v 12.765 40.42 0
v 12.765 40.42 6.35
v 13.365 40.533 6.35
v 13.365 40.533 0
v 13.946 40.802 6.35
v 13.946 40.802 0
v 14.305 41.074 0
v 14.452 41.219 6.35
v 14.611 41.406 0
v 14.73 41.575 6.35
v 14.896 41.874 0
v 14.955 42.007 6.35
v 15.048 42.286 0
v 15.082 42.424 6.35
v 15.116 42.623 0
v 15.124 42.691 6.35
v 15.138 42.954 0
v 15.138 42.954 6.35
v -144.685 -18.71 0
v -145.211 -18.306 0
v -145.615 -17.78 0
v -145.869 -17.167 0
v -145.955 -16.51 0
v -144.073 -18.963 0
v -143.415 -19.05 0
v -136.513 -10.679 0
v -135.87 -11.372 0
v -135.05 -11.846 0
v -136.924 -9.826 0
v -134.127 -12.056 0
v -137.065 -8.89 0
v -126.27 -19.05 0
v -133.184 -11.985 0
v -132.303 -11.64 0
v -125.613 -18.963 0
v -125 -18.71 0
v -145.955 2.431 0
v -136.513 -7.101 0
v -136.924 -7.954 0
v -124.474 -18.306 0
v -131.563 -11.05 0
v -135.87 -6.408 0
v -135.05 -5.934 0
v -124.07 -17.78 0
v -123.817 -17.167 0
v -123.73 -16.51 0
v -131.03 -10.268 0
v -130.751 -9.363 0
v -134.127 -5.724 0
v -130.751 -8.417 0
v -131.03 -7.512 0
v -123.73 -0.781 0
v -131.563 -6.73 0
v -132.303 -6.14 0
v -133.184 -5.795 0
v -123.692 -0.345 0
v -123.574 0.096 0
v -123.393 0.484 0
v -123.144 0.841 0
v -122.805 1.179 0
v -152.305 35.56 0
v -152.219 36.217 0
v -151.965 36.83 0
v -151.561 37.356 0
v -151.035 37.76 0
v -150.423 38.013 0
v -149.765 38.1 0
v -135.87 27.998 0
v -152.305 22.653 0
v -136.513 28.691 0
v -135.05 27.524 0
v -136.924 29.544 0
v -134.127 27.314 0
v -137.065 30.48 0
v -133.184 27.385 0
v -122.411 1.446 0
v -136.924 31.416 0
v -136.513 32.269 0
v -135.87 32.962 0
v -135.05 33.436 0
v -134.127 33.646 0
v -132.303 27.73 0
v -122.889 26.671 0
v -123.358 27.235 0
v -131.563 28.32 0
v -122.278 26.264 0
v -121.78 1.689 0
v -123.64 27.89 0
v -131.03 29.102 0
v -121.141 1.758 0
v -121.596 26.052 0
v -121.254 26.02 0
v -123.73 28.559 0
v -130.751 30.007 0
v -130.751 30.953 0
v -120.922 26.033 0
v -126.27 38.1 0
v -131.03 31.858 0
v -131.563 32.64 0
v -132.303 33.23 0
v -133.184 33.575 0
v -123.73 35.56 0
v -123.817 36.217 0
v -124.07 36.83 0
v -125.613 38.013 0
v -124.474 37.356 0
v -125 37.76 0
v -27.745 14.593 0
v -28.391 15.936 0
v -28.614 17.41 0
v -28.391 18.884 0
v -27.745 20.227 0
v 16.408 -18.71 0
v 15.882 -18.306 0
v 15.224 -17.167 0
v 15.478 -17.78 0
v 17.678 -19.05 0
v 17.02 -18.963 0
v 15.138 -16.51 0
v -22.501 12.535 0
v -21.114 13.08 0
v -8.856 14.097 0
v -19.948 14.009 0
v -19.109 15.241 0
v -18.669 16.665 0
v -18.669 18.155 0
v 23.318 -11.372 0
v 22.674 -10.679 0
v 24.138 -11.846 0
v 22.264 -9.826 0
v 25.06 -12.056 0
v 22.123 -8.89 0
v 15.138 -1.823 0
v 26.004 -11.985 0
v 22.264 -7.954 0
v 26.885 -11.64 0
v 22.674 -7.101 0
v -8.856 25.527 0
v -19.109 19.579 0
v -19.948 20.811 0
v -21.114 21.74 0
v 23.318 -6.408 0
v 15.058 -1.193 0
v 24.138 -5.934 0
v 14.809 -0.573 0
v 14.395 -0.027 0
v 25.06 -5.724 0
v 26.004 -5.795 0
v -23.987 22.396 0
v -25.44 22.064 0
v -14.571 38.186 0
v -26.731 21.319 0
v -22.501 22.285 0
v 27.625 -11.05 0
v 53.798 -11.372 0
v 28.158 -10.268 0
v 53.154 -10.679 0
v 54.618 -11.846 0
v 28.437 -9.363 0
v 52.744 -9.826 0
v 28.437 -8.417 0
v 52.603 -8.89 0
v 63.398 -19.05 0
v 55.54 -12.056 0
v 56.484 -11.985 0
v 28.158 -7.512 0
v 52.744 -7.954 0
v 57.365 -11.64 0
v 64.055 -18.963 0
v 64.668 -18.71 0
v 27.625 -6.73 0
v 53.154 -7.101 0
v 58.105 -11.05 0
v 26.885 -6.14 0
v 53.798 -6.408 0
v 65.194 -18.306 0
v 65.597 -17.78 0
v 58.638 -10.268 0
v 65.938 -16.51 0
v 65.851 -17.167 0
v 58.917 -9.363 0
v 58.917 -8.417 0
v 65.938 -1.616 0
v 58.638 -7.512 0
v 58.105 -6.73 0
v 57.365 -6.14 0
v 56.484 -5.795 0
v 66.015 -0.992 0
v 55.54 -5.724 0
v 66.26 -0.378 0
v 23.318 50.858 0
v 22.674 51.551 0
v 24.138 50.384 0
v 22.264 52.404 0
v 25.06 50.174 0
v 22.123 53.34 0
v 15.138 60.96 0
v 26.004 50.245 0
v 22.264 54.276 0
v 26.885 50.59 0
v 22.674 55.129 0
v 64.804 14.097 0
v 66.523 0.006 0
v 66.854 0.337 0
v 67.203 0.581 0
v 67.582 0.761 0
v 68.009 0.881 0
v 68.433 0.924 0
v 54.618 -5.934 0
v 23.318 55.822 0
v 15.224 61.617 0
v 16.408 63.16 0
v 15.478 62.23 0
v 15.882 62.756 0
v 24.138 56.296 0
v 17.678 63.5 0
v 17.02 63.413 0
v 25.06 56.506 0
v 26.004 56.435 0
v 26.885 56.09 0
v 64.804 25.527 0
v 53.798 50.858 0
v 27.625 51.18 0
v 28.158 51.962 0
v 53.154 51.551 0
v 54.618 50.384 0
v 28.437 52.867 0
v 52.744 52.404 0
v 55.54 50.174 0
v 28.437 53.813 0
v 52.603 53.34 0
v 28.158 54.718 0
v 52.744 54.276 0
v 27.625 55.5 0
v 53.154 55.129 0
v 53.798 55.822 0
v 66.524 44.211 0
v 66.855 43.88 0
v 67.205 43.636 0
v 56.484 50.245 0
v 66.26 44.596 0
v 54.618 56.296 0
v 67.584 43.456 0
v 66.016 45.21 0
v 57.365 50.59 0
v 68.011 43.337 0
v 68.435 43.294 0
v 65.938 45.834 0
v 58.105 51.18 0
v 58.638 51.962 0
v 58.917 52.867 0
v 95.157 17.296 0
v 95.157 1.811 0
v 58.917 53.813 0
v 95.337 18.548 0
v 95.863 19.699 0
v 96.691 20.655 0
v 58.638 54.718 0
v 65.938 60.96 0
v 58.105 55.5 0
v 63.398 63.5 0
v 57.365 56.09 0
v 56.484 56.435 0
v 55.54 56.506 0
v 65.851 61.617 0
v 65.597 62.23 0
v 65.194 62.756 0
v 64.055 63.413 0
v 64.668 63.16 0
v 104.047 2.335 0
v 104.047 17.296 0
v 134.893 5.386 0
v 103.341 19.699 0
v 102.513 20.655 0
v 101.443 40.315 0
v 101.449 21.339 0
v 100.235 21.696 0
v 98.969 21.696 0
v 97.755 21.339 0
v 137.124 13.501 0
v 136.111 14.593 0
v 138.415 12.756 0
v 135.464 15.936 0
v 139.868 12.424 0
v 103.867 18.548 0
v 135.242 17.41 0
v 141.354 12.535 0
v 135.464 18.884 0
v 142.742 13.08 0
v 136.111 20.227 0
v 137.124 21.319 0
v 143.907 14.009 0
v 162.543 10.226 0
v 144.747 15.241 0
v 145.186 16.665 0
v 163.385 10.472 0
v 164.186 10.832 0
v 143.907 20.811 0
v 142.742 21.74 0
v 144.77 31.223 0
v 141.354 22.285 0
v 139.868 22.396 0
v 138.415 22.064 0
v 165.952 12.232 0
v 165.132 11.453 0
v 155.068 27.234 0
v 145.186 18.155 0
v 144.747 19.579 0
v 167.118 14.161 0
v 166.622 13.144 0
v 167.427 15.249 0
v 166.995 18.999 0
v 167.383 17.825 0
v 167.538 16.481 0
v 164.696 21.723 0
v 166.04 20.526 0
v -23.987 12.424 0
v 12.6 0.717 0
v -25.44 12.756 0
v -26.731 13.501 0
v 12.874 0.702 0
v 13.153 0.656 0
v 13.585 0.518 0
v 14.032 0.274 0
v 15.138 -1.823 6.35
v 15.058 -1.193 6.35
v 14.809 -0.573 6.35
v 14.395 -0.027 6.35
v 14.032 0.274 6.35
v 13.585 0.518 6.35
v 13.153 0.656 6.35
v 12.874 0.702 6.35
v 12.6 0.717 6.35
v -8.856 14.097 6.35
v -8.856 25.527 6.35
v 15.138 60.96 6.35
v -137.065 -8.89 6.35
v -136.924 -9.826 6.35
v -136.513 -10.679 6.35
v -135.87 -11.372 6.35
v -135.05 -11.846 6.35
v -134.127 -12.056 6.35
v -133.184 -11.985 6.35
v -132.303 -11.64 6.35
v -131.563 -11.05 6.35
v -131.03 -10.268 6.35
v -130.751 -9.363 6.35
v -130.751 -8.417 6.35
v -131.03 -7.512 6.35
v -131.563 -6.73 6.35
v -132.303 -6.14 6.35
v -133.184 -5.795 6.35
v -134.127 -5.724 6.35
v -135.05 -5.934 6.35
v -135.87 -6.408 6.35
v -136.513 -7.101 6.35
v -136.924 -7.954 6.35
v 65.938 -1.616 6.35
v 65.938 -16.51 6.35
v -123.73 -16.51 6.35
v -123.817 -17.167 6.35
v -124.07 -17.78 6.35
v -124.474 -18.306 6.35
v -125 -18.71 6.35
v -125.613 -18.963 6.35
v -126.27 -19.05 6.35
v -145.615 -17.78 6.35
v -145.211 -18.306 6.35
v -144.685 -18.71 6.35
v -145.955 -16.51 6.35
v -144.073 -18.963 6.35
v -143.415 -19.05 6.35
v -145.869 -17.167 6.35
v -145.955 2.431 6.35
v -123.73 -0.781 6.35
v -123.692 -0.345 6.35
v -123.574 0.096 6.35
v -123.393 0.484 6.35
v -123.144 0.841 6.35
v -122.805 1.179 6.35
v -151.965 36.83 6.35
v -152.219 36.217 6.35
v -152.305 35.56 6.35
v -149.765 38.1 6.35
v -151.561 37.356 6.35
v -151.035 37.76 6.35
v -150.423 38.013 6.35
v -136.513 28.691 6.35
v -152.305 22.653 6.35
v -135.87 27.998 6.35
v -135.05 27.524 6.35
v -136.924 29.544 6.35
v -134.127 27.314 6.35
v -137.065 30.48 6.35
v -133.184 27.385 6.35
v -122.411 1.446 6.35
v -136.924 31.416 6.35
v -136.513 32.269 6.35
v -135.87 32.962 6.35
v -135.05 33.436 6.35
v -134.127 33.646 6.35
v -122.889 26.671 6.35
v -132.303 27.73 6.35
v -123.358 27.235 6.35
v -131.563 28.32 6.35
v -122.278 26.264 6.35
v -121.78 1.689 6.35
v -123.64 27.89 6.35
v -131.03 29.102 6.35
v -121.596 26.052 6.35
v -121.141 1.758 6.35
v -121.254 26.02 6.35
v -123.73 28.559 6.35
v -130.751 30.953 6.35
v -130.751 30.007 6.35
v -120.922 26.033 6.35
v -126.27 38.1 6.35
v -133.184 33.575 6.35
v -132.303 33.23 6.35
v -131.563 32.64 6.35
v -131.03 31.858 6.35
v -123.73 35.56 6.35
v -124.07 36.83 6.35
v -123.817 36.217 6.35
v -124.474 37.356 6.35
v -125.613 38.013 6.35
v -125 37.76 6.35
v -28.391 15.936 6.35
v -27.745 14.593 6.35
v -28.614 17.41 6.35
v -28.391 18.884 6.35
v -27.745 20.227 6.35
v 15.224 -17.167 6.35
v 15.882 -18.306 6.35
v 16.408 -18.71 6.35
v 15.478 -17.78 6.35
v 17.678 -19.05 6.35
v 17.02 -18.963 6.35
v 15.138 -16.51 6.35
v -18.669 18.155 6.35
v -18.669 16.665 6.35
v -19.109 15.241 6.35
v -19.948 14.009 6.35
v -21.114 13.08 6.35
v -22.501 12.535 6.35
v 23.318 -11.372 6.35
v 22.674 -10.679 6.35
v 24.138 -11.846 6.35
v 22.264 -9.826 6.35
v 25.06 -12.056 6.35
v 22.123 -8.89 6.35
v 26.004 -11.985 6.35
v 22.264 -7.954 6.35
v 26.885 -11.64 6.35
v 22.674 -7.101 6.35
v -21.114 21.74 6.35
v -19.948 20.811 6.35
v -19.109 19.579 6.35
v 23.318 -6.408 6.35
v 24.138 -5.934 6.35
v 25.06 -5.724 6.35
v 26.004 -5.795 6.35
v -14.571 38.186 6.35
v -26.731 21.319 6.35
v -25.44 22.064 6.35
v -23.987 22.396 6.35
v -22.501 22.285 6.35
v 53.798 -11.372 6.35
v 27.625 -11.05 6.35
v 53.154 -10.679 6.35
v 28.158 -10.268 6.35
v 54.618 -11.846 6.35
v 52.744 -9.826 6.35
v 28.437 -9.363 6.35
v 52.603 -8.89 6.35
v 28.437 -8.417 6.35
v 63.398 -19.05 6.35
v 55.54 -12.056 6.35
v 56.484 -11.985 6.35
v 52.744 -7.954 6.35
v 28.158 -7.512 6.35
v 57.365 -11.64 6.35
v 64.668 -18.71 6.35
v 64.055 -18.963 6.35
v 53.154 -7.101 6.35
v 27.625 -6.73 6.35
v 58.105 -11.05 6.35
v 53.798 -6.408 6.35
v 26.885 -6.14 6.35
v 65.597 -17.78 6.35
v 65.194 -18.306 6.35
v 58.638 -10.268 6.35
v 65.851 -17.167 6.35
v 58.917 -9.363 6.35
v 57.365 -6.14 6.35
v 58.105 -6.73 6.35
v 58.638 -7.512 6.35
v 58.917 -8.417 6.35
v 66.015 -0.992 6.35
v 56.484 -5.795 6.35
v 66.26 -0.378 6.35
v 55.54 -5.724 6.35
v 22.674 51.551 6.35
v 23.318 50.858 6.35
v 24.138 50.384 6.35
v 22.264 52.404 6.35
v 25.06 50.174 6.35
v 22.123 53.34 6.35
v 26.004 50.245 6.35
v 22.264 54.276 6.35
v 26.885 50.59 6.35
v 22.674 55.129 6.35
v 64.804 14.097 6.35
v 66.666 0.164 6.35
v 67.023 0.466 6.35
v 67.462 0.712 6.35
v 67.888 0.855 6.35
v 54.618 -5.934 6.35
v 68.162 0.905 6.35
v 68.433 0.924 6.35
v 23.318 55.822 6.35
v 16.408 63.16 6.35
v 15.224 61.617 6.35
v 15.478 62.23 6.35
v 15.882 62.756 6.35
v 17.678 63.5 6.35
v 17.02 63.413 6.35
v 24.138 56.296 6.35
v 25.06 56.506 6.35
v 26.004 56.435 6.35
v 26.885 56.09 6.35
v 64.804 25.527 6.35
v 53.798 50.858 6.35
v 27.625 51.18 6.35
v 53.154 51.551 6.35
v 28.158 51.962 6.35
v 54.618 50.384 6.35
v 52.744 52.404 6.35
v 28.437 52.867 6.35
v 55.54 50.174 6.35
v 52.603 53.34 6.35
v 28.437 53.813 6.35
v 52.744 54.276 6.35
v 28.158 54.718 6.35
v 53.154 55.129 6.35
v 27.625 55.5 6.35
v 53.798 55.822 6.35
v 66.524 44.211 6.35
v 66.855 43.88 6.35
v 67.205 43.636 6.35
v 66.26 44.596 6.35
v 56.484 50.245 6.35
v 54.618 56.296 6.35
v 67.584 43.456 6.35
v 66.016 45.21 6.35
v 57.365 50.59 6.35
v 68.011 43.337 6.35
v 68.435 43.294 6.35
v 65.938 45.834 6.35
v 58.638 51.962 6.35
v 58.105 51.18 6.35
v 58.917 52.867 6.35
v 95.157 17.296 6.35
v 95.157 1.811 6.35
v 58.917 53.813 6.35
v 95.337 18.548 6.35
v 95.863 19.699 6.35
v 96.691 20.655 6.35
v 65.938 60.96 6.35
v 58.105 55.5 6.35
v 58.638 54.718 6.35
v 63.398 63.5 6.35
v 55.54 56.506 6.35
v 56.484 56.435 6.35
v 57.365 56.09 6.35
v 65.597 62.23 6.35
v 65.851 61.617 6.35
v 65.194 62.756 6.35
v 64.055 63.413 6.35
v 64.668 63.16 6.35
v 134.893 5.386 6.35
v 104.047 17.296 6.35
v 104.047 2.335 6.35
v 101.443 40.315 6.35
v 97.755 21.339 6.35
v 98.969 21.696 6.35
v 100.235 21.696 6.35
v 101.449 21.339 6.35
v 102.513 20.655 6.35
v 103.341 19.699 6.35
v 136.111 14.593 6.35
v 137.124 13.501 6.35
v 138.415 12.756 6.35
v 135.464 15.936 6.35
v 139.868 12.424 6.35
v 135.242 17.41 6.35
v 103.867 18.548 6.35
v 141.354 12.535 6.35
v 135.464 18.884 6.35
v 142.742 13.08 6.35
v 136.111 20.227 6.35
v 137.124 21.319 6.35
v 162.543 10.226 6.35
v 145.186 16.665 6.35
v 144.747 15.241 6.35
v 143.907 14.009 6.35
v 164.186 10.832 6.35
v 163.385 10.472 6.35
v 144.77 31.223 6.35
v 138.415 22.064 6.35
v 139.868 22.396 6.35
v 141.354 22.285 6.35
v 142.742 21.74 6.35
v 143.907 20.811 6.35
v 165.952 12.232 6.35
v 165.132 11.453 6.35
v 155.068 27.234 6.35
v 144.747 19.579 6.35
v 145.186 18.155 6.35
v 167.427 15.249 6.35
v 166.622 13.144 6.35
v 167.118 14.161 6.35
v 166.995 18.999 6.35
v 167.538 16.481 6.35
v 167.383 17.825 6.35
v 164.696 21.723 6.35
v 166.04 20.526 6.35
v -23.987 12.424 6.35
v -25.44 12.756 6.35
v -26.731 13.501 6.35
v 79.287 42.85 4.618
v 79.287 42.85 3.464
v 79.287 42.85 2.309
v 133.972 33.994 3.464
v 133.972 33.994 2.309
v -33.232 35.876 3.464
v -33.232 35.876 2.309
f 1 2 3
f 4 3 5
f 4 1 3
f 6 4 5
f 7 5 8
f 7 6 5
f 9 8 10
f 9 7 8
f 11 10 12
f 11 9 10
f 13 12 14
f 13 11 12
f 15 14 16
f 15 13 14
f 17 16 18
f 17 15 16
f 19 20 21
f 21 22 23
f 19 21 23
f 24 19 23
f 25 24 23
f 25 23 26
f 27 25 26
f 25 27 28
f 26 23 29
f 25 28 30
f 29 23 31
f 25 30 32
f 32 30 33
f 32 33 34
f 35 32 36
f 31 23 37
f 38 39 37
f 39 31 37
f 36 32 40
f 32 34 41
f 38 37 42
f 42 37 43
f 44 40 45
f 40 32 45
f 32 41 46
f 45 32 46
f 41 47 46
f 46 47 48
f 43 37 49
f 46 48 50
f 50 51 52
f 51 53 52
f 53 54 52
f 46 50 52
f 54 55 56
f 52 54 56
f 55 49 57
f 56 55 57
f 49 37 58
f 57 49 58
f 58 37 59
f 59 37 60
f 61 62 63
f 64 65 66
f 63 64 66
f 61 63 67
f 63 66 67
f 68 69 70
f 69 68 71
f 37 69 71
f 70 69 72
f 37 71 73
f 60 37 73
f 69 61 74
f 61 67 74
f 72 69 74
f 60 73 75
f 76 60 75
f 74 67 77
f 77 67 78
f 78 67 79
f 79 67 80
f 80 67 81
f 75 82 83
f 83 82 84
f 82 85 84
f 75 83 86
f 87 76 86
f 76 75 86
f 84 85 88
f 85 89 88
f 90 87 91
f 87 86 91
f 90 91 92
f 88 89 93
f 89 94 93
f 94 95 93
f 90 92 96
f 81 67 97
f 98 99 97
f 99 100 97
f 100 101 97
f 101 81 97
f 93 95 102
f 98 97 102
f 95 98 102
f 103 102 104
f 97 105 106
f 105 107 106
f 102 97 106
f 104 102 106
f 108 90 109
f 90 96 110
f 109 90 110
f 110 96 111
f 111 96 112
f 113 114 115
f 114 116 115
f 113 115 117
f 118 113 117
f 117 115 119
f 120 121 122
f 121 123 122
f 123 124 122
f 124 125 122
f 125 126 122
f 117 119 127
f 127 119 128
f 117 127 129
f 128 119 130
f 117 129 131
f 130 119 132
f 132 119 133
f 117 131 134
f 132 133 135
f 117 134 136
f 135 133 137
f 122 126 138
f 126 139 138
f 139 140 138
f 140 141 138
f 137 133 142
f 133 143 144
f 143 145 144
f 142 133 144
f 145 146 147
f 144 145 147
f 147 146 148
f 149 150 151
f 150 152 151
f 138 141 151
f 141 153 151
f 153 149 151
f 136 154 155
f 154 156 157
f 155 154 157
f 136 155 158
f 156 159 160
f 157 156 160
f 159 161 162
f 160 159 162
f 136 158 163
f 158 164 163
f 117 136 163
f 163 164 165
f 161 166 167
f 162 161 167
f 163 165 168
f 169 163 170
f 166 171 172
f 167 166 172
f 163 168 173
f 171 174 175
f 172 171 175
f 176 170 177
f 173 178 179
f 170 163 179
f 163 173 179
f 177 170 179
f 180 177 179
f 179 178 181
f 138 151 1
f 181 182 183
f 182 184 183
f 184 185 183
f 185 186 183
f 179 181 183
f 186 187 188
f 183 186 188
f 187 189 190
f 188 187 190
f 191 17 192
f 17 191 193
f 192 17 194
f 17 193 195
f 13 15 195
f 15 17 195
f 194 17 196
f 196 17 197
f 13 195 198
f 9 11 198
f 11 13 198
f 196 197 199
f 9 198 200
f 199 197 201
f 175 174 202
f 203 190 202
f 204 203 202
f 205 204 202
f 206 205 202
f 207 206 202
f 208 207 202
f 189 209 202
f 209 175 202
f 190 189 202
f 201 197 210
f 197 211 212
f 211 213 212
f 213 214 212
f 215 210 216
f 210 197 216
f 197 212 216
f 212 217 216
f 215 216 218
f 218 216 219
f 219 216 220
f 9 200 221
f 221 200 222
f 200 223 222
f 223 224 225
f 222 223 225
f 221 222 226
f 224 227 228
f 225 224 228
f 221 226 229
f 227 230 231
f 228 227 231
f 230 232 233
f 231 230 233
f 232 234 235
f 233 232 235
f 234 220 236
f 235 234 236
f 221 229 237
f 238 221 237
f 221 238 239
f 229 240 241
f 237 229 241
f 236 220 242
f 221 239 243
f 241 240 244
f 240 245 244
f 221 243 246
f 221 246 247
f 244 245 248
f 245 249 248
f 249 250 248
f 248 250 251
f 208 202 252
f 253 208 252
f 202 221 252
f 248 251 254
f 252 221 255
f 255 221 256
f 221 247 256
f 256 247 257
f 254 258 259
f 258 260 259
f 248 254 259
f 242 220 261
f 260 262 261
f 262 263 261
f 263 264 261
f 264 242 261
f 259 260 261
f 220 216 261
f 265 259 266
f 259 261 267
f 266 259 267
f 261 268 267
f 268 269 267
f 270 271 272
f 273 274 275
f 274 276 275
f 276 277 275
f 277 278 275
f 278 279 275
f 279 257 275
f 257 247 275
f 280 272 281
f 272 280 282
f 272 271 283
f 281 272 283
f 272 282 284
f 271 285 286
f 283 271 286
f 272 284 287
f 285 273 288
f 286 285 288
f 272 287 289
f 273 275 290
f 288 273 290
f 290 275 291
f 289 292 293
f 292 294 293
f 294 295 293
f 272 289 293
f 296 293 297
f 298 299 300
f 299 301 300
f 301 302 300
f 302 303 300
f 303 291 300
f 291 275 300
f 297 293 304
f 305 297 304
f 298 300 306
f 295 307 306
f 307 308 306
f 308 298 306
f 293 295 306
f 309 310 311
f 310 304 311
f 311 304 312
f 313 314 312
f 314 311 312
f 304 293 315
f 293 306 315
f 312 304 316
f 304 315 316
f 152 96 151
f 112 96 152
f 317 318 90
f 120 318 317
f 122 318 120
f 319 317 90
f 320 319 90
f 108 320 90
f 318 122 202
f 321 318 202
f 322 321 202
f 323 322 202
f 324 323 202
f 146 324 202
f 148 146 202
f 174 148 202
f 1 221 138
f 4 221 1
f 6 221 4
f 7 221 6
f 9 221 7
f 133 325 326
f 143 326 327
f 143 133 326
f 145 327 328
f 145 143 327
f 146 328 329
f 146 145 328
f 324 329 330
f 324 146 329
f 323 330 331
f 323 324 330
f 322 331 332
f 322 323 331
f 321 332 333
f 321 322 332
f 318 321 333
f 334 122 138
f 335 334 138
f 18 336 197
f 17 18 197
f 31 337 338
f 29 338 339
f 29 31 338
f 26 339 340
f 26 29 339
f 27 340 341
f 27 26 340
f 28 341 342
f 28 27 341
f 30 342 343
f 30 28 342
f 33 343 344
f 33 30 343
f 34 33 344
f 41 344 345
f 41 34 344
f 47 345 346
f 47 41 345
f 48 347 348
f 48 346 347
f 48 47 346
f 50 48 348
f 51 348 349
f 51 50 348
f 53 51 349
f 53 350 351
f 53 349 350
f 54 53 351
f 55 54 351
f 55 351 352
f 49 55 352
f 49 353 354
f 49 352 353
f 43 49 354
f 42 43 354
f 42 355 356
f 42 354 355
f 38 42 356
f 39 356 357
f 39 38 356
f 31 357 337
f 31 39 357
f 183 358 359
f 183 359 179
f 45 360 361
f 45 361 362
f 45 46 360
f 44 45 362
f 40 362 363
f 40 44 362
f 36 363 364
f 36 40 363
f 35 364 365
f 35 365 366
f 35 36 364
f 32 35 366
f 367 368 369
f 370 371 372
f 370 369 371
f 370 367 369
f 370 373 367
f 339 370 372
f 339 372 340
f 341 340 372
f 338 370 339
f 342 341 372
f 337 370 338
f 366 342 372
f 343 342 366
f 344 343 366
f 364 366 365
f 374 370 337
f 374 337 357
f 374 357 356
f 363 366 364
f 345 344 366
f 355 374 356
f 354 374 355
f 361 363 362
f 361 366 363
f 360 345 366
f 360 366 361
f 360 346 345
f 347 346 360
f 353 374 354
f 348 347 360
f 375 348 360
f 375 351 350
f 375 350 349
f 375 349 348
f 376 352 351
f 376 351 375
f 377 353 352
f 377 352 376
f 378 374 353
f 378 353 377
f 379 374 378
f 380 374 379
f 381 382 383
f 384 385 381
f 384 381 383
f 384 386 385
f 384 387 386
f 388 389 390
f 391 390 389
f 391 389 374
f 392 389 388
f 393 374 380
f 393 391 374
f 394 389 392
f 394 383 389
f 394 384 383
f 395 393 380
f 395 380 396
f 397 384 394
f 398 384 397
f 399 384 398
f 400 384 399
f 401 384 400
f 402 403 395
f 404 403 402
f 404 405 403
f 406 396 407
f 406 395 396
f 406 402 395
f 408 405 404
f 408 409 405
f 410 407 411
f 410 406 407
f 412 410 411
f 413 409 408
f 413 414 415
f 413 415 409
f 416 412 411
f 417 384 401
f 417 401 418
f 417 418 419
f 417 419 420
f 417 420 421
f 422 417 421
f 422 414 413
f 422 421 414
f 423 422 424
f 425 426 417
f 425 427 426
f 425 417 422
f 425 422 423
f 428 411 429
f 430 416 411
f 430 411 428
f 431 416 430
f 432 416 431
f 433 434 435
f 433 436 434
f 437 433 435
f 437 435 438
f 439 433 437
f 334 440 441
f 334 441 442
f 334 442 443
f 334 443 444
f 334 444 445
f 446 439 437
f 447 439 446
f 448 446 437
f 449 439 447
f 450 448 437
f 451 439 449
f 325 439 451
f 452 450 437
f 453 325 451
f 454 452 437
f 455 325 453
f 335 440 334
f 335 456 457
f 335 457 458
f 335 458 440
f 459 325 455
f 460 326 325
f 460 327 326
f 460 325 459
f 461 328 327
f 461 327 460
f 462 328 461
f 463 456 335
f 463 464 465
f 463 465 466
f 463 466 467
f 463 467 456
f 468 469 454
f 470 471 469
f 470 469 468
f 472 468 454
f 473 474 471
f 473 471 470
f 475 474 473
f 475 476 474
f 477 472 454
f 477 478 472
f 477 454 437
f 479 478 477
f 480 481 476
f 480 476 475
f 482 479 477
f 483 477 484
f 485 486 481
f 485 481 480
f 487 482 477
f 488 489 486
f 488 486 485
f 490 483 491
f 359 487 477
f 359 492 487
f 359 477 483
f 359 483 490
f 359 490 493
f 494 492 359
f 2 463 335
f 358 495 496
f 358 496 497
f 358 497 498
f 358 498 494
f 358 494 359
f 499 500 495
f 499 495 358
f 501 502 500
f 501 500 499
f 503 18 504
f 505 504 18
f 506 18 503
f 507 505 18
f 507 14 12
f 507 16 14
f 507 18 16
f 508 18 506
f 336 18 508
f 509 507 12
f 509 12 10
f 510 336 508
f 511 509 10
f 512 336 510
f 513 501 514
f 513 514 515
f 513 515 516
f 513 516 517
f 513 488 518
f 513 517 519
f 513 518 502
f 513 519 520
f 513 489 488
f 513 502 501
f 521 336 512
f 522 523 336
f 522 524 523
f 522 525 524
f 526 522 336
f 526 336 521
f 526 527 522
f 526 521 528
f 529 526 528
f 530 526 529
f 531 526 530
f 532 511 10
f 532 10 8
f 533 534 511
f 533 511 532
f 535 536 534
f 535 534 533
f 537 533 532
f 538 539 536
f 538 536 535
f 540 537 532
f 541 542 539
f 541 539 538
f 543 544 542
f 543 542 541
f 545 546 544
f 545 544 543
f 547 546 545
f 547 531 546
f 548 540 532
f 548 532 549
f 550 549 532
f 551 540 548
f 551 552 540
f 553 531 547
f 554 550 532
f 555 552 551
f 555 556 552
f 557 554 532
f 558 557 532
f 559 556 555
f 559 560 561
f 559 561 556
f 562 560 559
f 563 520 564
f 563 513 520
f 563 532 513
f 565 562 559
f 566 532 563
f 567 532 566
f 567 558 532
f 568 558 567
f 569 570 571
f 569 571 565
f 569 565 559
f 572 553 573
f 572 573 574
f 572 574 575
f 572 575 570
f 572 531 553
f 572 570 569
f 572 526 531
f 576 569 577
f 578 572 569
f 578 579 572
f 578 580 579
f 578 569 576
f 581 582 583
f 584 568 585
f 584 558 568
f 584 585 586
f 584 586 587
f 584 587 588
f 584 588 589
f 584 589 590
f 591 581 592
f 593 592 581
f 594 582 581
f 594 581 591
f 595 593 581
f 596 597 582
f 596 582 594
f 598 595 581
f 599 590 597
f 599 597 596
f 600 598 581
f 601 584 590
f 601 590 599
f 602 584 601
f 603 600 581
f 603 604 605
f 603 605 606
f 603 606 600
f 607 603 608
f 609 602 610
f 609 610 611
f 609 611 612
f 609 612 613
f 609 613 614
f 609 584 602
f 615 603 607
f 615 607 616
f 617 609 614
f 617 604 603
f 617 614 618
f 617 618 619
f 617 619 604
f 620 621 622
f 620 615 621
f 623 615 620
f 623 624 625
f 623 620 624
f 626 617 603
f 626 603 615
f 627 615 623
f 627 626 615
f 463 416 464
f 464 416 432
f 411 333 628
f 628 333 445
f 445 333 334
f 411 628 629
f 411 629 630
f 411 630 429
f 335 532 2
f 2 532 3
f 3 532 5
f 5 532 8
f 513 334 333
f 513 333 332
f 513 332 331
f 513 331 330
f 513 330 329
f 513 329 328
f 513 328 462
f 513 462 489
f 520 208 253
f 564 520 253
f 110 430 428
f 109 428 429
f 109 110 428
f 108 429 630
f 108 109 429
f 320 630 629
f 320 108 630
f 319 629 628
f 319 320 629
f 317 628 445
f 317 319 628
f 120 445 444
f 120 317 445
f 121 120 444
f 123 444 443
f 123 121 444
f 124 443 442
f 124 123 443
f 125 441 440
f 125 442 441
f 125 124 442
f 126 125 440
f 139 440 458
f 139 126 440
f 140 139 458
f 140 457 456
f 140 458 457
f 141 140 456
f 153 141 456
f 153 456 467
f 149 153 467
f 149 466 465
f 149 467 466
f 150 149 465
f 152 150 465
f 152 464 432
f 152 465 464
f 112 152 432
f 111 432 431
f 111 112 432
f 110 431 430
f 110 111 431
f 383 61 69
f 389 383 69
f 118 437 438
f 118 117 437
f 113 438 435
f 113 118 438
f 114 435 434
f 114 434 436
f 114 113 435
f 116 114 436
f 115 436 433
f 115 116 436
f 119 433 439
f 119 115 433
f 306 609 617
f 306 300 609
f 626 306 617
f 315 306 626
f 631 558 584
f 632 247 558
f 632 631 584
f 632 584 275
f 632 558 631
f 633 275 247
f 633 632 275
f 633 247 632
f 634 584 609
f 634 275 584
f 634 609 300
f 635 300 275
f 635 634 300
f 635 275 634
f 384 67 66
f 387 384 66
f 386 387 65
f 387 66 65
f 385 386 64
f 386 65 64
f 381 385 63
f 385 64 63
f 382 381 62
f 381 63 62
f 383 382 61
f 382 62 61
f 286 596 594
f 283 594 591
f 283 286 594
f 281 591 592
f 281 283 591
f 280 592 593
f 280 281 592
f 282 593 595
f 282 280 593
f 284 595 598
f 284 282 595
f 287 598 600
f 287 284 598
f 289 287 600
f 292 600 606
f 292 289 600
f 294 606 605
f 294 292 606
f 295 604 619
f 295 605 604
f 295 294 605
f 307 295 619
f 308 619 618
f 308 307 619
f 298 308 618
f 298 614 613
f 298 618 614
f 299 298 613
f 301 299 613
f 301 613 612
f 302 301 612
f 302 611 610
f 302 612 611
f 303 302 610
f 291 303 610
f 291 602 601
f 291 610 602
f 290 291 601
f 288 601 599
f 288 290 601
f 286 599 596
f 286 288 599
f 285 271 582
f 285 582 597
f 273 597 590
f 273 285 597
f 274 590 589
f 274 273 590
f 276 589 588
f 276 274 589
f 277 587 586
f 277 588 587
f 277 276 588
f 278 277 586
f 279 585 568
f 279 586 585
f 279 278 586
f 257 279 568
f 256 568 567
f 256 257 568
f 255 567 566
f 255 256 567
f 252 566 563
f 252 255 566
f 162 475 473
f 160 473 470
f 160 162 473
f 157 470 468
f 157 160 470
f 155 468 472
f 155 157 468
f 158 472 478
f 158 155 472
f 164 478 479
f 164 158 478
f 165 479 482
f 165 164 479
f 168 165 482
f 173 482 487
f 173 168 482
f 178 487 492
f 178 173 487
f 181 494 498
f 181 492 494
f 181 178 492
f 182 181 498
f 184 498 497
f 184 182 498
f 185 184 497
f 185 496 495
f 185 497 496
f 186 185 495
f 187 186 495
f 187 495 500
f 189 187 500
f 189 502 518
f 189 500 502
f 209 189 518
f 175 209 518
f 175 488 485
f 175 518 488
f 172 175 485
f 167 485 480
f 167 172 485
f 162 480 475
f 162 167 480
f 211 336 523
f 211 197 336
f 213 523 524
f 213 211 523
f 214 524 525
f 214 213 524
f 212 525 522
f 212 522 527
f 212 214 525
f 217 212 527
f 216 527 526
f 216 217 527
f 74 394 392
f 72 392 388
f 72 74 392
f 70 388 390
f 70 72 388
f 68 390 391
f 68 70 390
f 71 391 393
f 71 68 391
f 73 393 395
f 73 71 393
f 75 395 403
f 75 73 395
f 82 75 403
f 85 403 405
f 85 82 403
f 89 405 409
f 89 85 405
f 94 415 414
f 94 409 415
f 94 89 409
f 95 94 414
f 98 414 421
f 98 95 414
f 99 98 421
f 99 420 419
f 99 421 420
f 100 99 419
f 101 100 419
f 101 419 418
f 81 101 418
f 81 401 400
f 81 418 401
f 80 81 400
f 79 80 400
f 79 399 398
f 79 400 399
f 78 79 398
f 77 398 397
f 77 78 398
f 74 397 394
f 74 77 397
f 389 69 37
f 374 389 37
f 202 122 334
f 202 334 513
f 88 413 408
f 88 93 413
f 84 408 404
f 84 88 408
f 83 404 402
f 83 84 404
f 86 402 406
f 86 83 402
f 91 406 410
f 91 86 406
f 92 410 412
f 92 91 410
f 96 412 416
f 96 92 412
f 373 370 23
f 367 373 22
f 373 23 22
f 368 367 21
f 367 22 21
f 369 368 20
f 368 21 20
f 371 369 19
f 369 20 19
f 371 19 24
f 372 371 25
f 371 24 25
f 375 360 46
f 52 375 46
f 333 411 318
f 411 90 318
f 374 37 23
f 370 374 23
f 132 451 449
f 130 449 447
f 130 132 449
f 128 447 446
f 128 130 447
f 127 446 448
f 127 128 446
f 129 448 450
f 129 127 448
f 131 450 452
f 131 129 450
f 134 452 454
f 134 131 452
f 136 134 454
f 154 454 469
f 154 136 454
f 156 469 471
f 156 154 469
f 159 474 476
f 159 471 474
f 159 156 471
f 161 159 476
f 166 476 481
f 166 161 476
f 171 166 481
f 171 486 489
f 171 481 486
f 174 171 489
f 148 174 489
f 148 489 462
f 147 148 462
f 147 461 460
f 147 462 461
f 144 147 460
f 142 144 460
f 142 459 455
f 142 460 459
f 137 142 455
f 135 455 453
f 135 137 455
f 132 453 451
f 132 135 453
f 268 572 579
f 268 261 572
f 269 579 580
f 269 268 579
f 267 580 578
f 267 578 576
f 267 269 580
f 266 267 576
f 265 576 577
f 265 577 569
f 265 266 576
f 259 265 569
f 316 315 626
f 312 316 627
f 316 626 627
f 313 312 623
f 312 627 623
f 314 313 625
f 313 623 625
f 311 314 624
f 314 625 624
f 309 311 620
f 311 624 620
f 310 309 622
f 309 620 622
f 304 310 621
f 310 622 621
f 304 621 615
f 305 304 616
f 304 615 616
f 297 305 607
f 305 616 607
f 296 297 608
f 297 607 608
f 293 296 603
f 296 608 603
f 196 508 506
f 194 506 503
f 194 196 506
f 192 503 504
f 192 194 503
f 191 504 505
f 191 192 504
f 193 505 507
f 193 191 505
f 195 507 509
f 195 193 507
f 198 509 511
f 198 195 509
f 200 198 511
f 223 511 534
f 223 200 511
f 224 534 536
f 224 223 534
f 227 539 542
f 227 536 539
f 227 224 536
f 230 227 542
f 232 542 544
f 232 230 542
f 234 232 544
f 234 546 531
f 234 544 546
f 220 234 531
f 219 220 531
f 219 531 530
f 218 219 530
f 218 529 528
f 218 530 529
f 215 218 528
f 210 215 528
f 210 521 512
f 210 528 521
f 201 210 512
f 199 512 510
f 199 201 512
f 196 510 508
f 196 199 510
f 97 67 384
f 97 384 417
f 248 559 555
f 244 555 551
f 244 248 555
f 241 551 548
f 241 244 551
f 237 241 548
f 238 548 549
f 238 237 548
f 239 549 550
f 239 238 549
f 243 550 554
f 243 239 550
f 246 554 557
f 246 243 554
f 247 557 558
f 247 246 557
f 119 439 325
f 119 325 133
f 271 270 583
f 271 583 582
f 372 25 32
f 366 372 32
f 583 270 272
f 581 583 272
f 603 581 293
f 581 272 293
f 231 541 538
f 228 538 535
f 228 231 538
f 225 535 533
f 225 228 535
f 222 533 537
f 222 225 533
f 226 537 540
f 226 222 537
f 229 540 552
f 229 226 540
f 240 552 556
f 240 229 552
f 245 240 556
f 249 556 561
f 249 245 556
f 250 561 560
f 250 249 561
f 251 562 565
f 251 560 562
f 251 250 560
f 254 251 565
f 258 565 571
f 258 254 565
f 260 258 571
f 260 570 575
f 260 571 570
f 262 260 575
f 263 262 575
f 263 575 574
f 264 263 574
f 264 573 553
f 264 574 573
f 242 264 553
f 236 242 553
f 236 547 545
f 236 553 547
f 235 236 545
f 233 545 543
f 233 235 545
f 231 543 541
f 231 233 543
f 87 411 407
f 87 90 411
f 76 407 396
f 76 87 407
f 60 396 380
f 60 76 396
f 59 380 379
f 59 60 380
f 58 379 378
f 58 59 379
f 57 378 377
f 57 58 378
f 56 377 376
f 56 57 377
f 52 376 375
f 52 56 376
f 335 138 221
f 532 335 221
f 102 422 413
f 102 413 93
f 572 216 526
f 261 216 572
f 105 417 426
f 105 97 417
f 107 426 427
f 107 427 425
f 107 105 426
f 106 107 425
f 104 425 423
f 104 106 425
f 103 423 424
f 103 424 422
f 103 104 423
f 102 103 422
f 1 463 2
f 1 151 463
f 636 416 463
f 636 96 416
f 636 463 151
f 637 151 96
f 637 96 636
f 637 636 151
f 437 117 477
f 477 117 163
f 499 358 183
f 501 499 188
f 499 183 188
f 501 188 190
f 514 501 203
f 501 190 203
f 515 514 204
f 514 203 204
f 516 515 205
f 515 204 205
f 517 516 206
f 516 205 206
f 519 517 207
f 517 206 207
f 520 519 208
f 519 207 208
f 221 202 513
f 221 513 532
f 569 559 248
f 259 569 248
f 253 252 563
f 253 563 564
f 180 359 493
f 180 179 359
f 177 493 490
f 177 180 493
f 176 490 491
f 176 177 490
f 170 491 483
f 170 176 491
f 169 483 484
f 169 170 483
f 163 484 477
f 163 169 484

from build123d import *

# Parameters (mm, degrees)
BOSS_EXTRUDE1_DEPTH = 6.35
FILLET1_R           = 6.35
SKETCH2_W           = 50.8
SKETCH2_H           = 6.35
BOSS_EXTRUDE2_DEPTH = 19.05
SKETCH3_W           = 50.8
SKETCH3_H           = 6.35
BOSS_EXTRUDE3_DEPTH = 38.1
SKETCH4_W           = 50.8
SKETCH4_H           = 6.35
BOSS_EXTRUDE4_DEPTH = 63.5
FILLET2_R           = 2.54
SKETCH5_R           = 5
SKETCH5_W           = 73.66
SKETCH5_H           = 11.43
CUT_EXTRUDE3_DEPTH  = 284.408566149
SKETCH6_R           = 3.175
CUT_EXTRUDE4_DEPTH  = 284.408566149
SKETCH8_R           = 3.175
CUT_EXTRUDE5_DEPTH  = 284.408566149
CUT_EXTRUDE6_DEPTH  = 180.280400037


with BuildPart() as part:
    # Sketch1 → Boss-Extrude1 (new body)
    with BuildSketch(Plane.XY):
        with BuildLine():
            add(Edge.make_bspline(
                [(-276.130119323, 8.693130358), (-231.459725957, 13.892182525), (-160.606907467, 22.045765928), (-55.21857633, 32.848239562), (-5.484684229, 39.5878223), (20.294760191, 40.734135472), (52.215253795, 43.311195196), (77.433370096, 43.854837121), (107.657853328, 39.590984865), (131.131357877, 34.766526999), (149.499224412, 30.294140301), (163.418705178, 23.059137739), (171.530279946, 16.921852673), (175.269753602, 13.29140622)],
                knots=[0, 0, 0, 0, 0.247403676, 0.462108507, 0.504395118, 0.627983171, 0.653401948, 0.743134379, 0.818760812, 0.882434425, 0.924179622, 0.96050512, 1, 1, 1, 1], degree=3))
            add(Edge.make_bspline(
                [(-276.130119323, 8.693130358), (-174.260953063, 0.911239157), (-23.669401798, 0.683864032), (127.515095646, 0.681371654), (175.269753602, 13.29140622)],
                knots=[0, 0, 0, 0, 0.67646369, 1, 1, 1, 1], degree=3))
        make_face()
    extrude(amount=BOSS_EXTRUDE1_DEPTH)

    # Fillet1
    fillet1_edges = [part.edges().sort_by_distance(p)[0] for p in [
        (175.269753602, 13.29140622, 3.175),
    ]]
    fillet(fillet1_edges, radius=FILLET1_R)

    # Sketch2 → Boss-Extrude2 (add, symmetric)
    with BuildSketch(Plane(origin=(0, 0, 0), x_dir=(1, 0, 0), z_dir=(0, 1, 0))):
        with Locations((-149.130119323, -3.175)):
            Rectangle(SKETCH2_W, SKETCH2_H)
        with Locations((40.537724966, -3.175)):
            Rectangle(SKETCH2_W, SKETCH2_H)
    extrude(amount=BOSS_EXTRUDE2_DEPTH, both=True)

    # Sketch3 → Boss-Extrude3 (add)
    with BuildSketch(Plane(origin=(0, 0, 0), x_dir=(1, 0, 0), z_dir=(0, 1, 0))):
        with Locations((-149.130119323, -3.175)):
            Rectangle(SKETCH3_W, SKETCH3_H)
    extrude(amount=BOSS_EXTRUDE3_DEPTH)

    # Sketch4 → Boss-Extrude4 (add)
    with BuildSketch(Plane(origin=(0, 0, 0), x_dir=(1, 0, 0), z_dir=(0, 1, 0))):
        with Locations((40.537724966, -3.175)):
            Rectangle(SKETCH4_W, SKETCH4_H)
    extrude(amount=BOSS_EXTRUDE4_DEPTH)

    # Fillet2
    fillet2_edges = [part.edges().sort_by_distance(p)[0] for p in [
        (65.937724966, 0.882409675, 3.175),
        (15.137724966, 0.715325792, 3.175),
        (-123.730119323, 1.809475424, 3.175),
        (-174.530119323, 3.18492072, 3.175),
        (-174.530119323, 20.264304266, 3.175),
        (-123.730119323, 25.734914395, 3.175),
        (15.137724966, 40.575893827, 3.175),
        (65.937724966, 43.322928246, 3.175),
        (65.937724966, -19.05, 3.175),
        (15.137724966, -19.05, 3.175),
        (-174.530119323, -19.05, 3.175),
        (-123.730119323, -19.05, 3.175),
        (-174.530119323, 38.1, 3.175),
        (-123.730119323, 38.1, 3.175),
        (65.937724966, 63.5, 3.175),
        (15.137724966, 63.5, 3.175),
    ]]
    fillet(fillet2_edges, radius=FILLET2_R)

    # Sketch5 → Cut-Extrude3 (cut, through all)
    with BuildSketch(Plane.XY):
        with Locations(Location((140.241842338, 17.410004614, 0), (0, 0, 180))):
            Circle(SKETCH5_R)
        with Locations(Location((-23.613557662, 17.410004614, 0), (0, 0, 180))):
            Circle(SKETCH5_R)
        with Locations((27.973842338, 19.812)):
            Rectangle(SKETCH5_W, SKETCH5_H)
    extrude(amount=CUT_EXTRUDE3_DEPTH, mode=Mode.SUBTRACT)

    # Sketch6 → Cut-Extrude4 (cut, through all)
    with BuildSketch(Plane.XY):
        with Locations(Location((55.777724966, 53.34, 0), (0, 0, 180))):
            Circle(SKETCH6_R)
        with Locations(Location((25.297724966, 53.34, 0), (0, 0, 180))):
            Circle(SKETCH6_R)
        with Locations(Location((55.777724966, -8.89, 0), (0, 0, 180))):
            Circle(SKETCH6_R)
        with Locations(Location((25.297724966, -8.89, 0), (0, 0, 180))):
            Circle(SKETCH6_R)
        with Locations(Location((-133.890119323, 30.48, 0), (0, 0, 180))):
            Circle(SKETCH6_R)
        with Locations(Location((-164.370119323, 30.48, 0), (0, 0, 180))):
            Circle(SKETCH6_R)
        with Locations(Location((-133.890119323, -8.89, 0), (0, 0, 180))):
            Circle(SKETCH6_R)
        with Locations(Location((-164.370119323, -8.89, 0), (0, 0, 180))):
            Circle(SKETCH6_R)
    extrude(amount=CUT_EXTRUDE4_DEPTH, mode=Mode.SUBTRACT)

    # Sketch8 → Cut-Extrude5 (cut, through all)
    with BuildSketch(Plane(origin=(0, 0, 0), x_dir=(-1, 0, 0), z_dir=(0, 0, -1))):
        with BuildLine():
            Line((152.305119323, 35.56), (152.305119323, 22.652979968))
            Line((152.305119323, 22.652979968), (145.955119323, 2.430574079))
            Line((145.955119323, 2.430574079), (145.955119323, -16.51))
            ThreePointArc((145.955119323, -16.51), (145.211170547, -18.306051224), (143.415119323, -19.05))
            Line((143.415119323, -19.05), (171.990119323, -19.05))
            ThreePointArc((171.990119323, -19.05), (173.786170547, -18.306051224), (174.530119323, -16.51))
            Line((174.530119323, -16.51), (174.530119323, 0.732669408))
            add(Edge.make_bspline(
                [(174.530119323, 0.732669408), (174.530119323, 0.827098892), (174.534332017, 0.922829058), (174.542975148, 1.019550557), (174.556231365, 1.116913443), (174.574237139, 1.214535389), (174.647171539, 1.525872583), (174.720530405, 1.739086636), (174.817987929, 1.947258959), (174.939041393, 2.145669731), (175.081636695, 2.329900504), (175.40320955, 2.663115508), (175.582254784, 2.812169869), (175.77623684, 2.94020009), (175.980813085, 3.044996297), (176.191284552, 3.125888304), (176.499832231, 3.209844277), (176.59675239, 3.231309016), (176.693582493, 3.24801799), (176.789935606, 3.260093994), (176.885455508, 3.26770712), (176.979825307, 3.271063977)],
                knots=[0, 0, 0, 0, 0, 0, 0, 0.156541714, 0.156541714, 0.156541714, 0.156541714, 0.156541714, 0.5, 0.5, 0.5, 0.5, 0.5, 0.843458286, 0.843458286, 0.843458286, 0.843458286, 0.843458286, 1, 1, 1, 1, 1, 1, 1], degree=6))
            add(Edge.make_bspline(
                [(276.130119323, 8.693130358), (243.083160763, 6.168638939), (210.036144296, 4.446920485), (176.979825307, 3.271063977)],
                knots=[0, 0, 0, 0, 0.219448812, 0.219448812, 0.219448812, 0.219448812], degree=3))
            add(Edge.make_bspline(
                [(276.130119323, 8.693130358), (241.143309206, 12.765139518), (210.289343773, 16.325674302), (176.792020475, 20.015402476)],
                knots=[0, 0, 0, 0, 0.193771865, 0.193771865, 0.193771865, 0.193771865], degree=3))
            add(Edge.make_bspline(
                [(176.792020475, 20.015402476), (176.702534659, 20.025259334), (176.612334841, 20.039047045), (176.521708613, 20.056916996), (176.430972739, 20.078987549), (176.340465644, 20.105336292), (176.052123832, 20.203632982), (175.856494206, 20.292258021), (175.667511078, 20.402173666), (175.489198081, 20.532546831), (175.325208173, 20.681273314), (175.070618463, 20.965445878), (174.972096017, 21.093854031), (174.883813086, 21.22927413), (174.806550855, 21.370274525), (174.740735934, 21.515302785), (174.633101241, 21.807741296), (174.590880763, 21.955079167), (174.559863739, 22.103342362), (174.539790441, 22.251097449), (174.530119323, 22.397057265), (174.530119323, 22.540132369)],
                knots=[0, 0, 0, 0, 0, 0, 0, 0.155935083, 0.155935083, 0.155935083, 0.155935083, 0.155935083, 0.499997058, 0.499997058, 0.499997058, 0.499997058, 0.499997058, 0.752183878, 0.752183878, 0.752183878, 0.752183878, 0.752183878, 1, 1, 1, 1, 1, 1, 1], degree=6))
            Line((174.530119323, 22.540132369), (174.530119323, 35.56))
            ThreePointArc((174.530119323, 35.56), (173.786170547, 37.356051224), (171.990119323, 38.1))
            Line((171.990119323, 38.1), (149.765119323, 38.1))
            ThreePointArc((149.765119323, 38.1), (151.561170547, 37.356051224), (152.305119323, 35.56))
        make_face()
        with Locations((164.370119323, -8.89)):
            Circle(SKETCH8_R, mode=Mode.SUBTRACT)
        with Locations((164.370119323, 30.48)):
            Circle(SKETCH8_R, mode=Mode.SUBTRACT)
    extrude(amount=-CUT_EXTRUDE5_DEPTH, mode=Mode.SUBTRACT)

    # Sketch10 → Cut-Extrude6 (cut, through all)
    with BuildSketch(Plane(origin=(0, 0, 0), x_dir=(-1, 0, 0), z_dir=(0, 0, -1))):
        with BuildLine():
            Line((-95.157002323, 17.295971295), (-95.157002323, 1.810619129))
            add(Edge.make_bspline(
                [(-95.157002323, 1.810619129), (-98.122222912, 1.963522837), (-101.08564833, 2.137394625), (-104.047002323, 2.335082223)],
                knots=[0.821015806, 0.821015806, 0.821015806, 0.821015806, 0.840729968, 0.840729968, 0.840729968, 0.840729968], degree=3))
            Line((-104.047002323, 2.335082223), (-104.047002323, 17.295971295))
            ThreePointArc((-104.047002323, 17.295971295), (-99.602002323, 21.740971295), (-95.157002323, 17.295971295))
        make_face()
    extrude(amount=-CUT_EXTRUDE6_DEPTH, mode=Mode.SUBTRACT)


solid = part.part
